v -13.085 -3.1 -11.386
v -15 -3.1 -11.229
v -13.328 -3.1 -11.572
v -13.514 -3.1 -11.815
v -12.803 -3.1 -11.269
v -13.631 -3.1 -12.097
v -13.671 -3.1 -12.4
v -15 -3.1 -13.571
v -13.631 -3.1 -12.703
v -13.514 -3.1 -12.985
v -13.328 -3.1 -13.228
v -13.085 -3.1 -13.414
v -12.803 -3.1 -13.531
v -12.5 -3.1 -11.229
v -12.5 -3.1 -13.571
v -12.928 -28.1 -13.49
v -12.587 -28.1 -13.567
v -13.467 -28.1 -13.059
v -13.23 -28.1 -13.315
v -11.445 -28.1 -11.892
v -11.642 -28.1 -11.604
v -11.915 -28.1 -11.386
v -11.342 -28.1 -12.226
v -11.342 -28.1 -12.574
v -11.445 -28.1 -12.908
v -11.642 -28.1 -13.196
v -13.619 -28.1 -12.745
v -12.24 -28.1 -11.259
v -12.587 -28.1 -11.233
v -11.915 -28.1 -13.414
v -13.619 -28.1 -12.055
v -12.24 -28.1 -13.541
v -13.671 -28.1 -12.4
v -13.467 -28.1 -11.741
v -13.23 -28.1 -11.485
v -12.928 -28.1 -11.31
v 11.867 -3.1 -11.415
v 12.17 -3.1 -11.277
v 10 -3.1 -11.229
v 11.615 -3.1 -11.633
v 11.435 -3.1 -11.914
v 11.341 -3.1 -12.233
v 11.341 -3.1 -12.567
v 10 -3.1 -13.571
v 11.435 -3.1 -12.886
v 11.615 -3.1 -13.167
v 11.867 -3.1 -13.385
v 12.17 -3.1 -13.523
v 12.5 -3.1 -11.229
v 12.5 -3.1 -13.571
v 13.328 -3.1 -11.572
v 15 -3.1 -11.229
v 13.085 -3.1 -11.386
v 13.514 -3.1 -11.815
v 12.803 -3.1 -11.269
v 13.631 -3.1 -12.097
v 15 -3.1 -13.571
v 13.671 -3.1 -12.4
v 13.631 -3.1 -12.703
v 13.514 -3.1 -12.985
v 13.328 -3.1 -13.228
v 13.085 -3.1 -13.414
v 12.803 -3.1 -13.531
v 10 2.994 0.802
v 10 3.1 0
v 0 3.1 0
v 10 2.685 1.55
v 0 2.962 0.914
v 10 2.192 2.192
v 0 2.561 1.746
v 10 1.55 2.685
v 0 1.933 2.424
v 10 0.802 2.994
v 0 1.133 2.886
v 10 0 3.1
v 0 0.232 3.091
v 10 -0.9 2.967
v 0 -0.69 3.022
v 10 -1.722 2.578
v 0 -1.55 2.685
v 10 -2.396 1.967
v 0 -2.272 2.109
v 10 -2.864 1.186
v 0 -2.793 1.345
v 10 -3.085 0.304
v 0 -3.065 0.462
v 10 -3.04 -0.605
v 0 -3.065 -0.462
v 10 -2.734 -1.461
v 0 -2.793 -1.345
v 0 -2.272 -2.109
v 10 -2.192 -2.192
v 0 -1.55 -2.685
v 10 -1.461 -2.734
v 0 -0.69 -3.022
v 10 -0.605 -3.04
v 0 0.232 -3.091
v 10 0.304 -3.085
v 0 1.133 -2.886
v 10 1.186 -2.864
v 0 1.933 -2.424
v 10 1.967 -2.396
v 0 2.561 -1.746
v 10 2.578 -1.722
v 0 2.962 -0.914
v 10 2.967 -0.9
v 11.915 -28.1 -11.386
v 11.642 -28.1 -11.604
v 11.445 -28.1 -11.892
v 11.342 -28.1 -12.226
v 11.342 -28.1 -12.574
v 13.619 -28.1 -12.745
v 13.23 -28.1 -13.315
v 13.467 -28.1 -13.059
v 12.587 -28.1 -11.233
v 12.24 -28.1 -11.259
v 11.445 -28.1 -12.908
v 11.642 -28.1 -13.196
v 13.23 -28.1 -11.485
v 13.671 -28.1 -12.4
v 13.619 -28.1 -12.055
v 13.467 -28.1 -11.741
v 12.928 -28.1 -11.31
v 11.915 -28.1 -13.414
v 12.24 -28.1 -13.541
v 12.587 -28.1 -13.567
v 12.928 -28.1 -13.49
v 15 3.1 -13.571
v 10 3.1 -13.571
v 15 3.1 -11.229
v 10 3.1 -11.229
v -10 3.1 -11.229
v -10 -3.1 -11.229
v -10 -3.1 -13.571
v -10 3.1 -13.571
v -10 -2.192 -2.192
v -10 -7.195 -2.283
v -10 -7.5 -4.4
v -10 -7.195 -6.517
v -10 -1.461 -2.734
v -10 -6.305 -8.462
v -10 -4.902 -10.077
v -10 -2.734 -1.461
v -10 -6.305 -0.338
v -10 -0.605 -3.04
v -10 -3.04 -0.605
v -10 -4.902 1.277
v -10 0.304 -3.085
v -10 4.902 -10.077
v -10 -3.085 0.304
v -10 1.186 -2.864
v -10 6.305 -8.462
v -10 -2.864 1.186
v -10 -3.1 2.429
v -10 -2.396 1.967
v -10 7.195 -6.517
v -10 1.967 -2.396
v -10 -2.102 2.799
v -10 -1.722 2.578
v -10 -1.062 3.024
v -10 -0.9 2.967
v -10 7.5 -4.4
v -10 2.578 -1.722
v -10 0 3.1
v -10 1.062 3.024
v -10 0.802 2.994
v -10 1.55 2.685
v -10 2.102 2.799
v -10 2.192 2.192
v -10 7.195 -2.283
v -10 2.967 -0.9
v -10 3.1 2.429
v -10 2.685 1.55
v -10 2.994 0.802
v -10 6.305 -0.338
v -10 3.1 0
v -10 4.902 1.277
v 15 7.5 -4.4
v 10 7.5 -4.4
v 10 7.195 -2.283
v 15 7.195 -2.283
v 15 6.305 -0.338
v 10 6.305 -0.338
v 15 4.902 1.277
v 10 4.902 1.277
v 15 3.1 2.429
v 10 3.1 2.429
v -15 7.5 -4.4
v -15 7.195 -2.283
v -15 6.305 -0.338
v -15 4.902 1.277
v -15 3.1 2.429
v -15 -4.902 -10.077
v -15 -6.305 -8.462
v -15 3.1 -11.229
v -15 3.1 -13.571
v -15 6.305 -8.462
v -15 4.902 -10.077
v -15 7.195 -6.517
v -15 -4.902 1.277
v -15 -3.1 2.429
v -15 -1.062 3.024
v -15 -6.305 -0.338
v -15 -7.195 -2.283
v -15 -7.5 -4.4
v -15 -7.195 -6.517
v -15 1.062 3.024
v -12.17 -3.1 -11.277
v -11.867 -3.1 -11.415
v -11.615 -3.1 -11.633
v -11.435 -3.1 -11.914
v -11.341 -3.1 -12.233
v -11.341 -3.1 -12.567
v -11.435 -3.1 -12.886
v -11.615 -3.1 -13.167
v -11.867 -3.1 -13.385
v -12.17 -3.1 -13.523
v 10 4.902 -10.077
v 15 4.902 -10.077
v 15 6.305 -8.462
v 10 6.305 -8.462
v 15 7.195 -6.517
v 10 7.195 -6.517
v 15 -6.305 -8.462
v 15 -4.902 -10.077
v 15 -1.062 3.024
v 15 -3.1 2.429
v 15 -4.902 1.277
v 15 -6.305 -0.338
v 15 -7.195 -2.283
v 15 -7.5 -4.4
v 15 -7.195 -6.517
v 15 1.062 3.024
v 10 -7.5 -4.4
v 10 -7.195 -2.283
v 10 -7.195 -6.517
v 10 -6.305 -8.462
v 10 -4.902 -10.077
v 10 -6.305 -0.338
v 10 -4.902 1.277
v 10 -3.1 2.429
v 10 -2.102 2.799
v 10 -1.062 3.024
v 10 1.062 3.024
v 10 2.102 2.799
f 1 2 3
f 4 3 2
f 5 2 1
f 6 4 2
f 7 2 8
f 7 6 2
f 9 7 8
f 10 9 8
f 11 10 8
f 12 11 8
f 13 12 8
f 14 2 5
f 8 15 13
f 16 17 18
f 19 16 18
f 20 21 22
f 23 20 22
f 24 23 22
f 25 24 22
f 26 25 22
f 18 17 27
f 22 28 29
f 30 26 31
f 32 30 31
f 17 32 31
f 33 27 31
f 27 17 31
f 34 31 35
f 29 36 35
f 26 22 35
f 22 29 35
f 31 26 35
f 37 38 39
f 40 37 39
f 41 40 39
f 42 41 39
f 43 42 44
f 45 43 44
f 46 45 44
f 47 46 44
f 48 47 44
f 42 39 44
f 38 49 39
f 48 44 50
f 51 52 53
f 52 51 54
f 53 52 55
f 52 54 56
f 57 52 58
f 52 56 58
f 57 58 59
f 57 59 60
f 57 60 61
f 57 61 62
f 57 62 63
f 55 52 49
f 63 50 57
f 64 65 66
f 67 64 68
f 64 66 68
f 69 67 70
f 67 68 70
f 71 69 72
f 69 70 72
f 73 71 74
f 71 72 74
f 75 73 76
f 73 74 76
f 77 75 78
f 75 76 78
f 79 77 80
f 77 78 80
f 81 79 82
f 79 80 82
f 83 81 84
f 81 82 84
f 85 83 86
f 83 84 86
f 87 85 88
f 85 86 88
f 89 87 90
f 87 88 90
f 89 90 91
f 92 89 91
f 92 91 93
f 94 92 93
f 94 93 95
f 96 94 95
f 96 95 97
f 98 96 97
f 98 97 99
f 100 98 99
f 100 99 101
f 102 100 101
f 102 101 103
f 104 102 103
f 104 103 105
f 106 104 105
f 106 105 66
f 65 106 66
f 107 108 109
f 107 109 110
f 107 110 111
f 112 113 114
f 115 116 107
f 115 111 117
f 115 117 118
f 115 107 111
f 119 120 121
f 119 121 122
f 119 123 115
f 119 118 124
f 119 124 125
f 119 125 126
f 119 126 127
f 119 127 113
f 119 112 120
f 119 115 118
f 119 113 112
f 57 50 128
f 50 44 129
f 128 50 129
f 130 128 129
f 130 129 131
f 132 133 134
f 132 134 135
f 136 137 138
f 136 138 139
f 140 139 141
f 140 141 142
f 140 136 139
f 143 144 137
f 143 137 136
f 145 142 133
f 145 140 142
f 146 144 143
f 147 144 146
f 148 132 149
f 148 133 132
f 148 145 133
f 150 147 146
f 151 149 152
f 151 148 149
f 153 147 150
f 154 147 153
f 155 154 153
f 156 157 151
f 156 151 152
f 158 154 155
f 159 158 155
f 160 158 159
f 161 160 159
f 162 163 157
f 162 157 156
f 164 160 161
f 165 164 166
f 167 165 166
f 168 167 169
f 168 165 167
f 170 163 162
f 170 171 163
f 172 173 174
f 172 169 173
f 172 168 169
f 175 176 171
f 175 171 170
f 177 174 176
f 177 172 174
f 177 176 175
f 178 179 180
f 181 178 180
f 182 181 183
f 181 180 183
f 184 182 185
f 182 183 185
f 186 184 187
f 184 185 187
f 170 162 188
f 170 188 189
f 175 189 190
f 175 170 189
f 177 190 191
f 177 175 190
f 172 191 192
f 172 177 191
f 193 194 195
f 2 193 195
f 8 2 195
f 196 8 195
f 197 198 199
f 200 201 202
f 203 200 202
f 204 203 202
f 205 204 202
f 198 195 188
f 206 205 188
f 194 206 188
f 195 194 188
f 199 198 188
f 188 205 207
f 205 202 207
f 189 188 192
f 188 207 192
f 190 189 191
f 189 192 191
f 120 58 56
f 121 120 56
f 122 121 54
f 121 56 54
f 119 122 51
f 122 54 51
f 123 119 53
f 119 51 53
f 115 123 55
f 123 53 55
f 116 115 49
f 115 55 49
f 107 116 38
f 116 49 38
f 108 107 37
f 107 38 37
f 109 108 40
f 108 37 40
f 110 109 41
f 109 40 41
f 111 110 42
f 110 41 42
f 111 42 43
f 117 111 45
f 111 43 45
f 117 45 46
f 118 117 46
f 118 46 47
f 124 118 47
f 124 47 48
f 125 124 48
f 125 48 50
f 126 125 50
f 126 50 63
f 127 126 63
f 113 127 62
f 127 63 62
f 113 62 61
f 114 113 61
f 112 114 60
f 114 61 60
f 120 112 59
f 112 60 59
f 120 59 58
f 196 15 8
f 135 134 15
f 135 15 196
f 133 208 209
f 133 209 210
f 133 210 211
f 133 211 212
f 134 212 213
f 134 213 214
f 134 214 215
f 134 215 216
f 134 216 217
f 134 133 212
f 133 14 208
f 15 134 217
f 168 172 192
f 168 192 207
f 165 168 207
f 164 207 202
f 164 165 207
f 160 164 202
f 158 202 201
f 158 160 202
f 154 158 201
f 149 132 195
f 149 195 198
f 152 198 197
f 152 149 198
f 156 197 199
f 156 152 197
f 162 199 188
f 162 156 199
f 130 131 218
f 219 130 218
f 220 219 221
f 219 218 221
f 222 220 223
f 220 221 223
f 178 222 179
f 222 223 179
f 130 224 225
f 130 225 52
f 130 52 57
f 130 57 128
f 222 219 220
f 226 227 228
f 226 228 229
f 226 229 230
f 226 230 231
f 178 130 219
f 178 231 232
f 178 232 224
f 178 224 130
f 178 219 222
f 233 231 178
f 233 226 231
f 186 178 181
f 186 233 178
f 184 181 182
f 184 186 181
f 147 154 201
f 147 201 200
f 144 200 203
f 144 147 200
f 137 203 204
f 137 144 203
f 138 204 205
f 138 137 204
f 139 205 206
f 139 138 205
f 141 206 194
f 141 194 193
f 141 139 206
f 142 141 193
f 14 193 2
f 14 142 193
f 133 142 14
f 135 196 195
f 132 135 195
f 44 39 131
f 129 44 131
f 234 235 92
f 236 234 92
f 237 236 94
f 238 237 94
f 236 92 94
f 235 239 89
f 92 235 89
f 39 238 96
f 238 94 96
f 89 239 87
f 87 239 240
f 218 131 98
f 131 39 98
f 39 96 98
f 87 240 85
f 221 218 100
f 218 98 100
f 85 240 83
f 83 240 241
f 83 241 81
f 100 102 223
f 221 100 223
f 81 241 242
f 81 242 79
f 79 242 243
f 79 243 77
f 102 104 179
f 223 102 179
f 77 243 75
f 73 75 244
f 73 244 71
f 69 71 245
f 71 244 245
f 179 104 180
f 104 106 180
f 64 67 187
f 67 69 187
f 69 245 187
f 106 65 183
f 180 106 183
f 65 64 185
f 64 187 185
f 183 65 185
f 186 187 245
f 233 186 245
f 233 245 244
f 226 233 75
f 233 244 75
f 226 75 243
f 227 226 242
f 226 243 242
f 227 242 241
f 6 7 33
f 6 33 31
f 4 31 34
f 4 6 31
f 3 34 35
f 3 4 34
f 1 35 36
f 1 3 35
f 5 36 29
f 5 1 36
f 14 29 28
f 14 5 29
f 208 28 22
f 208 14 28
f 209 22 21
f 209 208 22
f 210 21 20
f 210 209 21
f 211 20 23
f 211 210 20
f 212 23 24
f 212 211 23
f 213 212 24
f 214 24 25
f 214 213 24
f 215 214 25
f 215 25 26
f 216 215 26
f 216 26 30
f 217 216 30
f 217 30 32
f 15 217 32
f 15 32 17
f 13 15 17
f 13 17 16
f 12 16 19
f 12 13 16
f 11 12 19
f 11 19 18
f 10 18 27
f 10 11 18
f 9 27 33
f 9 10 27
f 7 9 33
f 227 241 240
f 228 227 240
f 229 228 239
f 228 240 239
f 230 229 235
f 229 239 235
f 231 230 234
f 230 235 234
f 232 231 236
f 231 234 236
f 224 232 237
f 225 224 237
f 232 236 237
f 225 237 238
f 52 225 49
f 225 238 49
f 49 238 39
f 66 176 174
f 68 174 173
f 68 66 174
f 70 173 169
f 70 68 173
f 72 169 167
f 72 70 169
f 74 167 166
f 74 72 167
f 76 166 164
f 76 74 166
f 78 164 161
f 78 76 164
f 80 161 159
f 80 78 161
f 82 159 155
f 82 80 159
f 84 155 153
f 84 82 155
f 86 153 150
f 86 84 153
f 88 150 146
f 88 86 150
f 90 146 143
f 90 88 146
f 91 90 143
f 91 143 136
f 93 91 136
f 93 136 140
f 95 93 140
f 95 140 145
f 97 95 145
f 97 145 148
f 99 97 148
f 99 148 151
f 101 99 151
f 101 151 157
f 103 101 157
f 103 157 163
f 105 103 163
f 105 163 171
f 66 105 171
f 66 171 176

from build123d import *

# Parameters (mm, degrees)
F0_R     = 3.1
F1_DEPTH = 10
F3_DEPTH = 5
F4_R     = 1.1706515684
F5_DEPTH = 25


with BuildPart() as f1:
    # F0 (on Right) → F1 (new body)
    with BuildSketch(Plane.YZ):
        Circle(F0_R)
    extrude(amount=F1_DEPTH)

    # F2 (on face) → F3 (join)
    with BuildSketch(Plane.YZ.offset(10)):
        with BuildLine():
            ThreePointArc((3.1, -11.2293484316), (6.3047601065, -8.4620192023), (7.5, -4.4))
            ThreePointArc((7.5, -4.4), (6.3047601065, -0.3379807977), (3.1, 2.4293484316))
            Line((3.1, 2.4293484316), (3.1, -11.2293484316))
        make_face()
        with BuildLine():
            Line((-3.1, 2.4293484316), (3.1, 2.4293484316))
            ThreePointArc((3.1, 2.4293484316), (0, 3.1), (-3.1, 2.4293484316))
        make_face()
        with BuildLine():
            Line((3.1, -11.2293484316), (3.1, 2.4293484316))
            Line((3.1, 2.4293484316), (-3.1, 2.4293484316))
            Line((-3.1, 2.4293484316), (-3.1, -11.2293484316))
            ThreePointArc((-3.1, -11.2293484316), (0, -11.9), (3.1, -11.2293484316))
        make_face()
        with BuildLine():
            Line((3.1, -13.5706515684), (3.1, -11.2293484316))
            ThreePointArc((3.1, -11.2293484316), (0, -11.9), (-3.1, -11.2293484316))
            Line((-3.1, -11.2293484316), (-3.1, -13.5706515684))
            Line((-3.1, -13.5706515684), (3.1, -13.5706515684))
        make_face()
        with BuildLine():
            Line((-3.1, -11.2293484316), (-3.1, 2.4293484316))
            ThreePointArc((-3.1, 2.4293484316), (-7.5, -4.4), (-3.1, -11.2293484316))
        make_face()
    extrude(amount=F3_DEPTH)

    # F4 (on face) → F5 (join)
    with BuildSketch(Plane.XZ.offset(3.1)):
        with Locations((12.5, -12.4)):
            Circle(F4_R)
    extrude(amount=F5_DEPTH)

    # F6: F1 across face


with BuildPart() as f1_1:
    add(f1.part)
    add(f1.part.mirror(Plane(origin=(0, 0, 0), x_dir=(0, 1, 0), z_dir=(-1, 0, 0))))


solid = f1_1.part
